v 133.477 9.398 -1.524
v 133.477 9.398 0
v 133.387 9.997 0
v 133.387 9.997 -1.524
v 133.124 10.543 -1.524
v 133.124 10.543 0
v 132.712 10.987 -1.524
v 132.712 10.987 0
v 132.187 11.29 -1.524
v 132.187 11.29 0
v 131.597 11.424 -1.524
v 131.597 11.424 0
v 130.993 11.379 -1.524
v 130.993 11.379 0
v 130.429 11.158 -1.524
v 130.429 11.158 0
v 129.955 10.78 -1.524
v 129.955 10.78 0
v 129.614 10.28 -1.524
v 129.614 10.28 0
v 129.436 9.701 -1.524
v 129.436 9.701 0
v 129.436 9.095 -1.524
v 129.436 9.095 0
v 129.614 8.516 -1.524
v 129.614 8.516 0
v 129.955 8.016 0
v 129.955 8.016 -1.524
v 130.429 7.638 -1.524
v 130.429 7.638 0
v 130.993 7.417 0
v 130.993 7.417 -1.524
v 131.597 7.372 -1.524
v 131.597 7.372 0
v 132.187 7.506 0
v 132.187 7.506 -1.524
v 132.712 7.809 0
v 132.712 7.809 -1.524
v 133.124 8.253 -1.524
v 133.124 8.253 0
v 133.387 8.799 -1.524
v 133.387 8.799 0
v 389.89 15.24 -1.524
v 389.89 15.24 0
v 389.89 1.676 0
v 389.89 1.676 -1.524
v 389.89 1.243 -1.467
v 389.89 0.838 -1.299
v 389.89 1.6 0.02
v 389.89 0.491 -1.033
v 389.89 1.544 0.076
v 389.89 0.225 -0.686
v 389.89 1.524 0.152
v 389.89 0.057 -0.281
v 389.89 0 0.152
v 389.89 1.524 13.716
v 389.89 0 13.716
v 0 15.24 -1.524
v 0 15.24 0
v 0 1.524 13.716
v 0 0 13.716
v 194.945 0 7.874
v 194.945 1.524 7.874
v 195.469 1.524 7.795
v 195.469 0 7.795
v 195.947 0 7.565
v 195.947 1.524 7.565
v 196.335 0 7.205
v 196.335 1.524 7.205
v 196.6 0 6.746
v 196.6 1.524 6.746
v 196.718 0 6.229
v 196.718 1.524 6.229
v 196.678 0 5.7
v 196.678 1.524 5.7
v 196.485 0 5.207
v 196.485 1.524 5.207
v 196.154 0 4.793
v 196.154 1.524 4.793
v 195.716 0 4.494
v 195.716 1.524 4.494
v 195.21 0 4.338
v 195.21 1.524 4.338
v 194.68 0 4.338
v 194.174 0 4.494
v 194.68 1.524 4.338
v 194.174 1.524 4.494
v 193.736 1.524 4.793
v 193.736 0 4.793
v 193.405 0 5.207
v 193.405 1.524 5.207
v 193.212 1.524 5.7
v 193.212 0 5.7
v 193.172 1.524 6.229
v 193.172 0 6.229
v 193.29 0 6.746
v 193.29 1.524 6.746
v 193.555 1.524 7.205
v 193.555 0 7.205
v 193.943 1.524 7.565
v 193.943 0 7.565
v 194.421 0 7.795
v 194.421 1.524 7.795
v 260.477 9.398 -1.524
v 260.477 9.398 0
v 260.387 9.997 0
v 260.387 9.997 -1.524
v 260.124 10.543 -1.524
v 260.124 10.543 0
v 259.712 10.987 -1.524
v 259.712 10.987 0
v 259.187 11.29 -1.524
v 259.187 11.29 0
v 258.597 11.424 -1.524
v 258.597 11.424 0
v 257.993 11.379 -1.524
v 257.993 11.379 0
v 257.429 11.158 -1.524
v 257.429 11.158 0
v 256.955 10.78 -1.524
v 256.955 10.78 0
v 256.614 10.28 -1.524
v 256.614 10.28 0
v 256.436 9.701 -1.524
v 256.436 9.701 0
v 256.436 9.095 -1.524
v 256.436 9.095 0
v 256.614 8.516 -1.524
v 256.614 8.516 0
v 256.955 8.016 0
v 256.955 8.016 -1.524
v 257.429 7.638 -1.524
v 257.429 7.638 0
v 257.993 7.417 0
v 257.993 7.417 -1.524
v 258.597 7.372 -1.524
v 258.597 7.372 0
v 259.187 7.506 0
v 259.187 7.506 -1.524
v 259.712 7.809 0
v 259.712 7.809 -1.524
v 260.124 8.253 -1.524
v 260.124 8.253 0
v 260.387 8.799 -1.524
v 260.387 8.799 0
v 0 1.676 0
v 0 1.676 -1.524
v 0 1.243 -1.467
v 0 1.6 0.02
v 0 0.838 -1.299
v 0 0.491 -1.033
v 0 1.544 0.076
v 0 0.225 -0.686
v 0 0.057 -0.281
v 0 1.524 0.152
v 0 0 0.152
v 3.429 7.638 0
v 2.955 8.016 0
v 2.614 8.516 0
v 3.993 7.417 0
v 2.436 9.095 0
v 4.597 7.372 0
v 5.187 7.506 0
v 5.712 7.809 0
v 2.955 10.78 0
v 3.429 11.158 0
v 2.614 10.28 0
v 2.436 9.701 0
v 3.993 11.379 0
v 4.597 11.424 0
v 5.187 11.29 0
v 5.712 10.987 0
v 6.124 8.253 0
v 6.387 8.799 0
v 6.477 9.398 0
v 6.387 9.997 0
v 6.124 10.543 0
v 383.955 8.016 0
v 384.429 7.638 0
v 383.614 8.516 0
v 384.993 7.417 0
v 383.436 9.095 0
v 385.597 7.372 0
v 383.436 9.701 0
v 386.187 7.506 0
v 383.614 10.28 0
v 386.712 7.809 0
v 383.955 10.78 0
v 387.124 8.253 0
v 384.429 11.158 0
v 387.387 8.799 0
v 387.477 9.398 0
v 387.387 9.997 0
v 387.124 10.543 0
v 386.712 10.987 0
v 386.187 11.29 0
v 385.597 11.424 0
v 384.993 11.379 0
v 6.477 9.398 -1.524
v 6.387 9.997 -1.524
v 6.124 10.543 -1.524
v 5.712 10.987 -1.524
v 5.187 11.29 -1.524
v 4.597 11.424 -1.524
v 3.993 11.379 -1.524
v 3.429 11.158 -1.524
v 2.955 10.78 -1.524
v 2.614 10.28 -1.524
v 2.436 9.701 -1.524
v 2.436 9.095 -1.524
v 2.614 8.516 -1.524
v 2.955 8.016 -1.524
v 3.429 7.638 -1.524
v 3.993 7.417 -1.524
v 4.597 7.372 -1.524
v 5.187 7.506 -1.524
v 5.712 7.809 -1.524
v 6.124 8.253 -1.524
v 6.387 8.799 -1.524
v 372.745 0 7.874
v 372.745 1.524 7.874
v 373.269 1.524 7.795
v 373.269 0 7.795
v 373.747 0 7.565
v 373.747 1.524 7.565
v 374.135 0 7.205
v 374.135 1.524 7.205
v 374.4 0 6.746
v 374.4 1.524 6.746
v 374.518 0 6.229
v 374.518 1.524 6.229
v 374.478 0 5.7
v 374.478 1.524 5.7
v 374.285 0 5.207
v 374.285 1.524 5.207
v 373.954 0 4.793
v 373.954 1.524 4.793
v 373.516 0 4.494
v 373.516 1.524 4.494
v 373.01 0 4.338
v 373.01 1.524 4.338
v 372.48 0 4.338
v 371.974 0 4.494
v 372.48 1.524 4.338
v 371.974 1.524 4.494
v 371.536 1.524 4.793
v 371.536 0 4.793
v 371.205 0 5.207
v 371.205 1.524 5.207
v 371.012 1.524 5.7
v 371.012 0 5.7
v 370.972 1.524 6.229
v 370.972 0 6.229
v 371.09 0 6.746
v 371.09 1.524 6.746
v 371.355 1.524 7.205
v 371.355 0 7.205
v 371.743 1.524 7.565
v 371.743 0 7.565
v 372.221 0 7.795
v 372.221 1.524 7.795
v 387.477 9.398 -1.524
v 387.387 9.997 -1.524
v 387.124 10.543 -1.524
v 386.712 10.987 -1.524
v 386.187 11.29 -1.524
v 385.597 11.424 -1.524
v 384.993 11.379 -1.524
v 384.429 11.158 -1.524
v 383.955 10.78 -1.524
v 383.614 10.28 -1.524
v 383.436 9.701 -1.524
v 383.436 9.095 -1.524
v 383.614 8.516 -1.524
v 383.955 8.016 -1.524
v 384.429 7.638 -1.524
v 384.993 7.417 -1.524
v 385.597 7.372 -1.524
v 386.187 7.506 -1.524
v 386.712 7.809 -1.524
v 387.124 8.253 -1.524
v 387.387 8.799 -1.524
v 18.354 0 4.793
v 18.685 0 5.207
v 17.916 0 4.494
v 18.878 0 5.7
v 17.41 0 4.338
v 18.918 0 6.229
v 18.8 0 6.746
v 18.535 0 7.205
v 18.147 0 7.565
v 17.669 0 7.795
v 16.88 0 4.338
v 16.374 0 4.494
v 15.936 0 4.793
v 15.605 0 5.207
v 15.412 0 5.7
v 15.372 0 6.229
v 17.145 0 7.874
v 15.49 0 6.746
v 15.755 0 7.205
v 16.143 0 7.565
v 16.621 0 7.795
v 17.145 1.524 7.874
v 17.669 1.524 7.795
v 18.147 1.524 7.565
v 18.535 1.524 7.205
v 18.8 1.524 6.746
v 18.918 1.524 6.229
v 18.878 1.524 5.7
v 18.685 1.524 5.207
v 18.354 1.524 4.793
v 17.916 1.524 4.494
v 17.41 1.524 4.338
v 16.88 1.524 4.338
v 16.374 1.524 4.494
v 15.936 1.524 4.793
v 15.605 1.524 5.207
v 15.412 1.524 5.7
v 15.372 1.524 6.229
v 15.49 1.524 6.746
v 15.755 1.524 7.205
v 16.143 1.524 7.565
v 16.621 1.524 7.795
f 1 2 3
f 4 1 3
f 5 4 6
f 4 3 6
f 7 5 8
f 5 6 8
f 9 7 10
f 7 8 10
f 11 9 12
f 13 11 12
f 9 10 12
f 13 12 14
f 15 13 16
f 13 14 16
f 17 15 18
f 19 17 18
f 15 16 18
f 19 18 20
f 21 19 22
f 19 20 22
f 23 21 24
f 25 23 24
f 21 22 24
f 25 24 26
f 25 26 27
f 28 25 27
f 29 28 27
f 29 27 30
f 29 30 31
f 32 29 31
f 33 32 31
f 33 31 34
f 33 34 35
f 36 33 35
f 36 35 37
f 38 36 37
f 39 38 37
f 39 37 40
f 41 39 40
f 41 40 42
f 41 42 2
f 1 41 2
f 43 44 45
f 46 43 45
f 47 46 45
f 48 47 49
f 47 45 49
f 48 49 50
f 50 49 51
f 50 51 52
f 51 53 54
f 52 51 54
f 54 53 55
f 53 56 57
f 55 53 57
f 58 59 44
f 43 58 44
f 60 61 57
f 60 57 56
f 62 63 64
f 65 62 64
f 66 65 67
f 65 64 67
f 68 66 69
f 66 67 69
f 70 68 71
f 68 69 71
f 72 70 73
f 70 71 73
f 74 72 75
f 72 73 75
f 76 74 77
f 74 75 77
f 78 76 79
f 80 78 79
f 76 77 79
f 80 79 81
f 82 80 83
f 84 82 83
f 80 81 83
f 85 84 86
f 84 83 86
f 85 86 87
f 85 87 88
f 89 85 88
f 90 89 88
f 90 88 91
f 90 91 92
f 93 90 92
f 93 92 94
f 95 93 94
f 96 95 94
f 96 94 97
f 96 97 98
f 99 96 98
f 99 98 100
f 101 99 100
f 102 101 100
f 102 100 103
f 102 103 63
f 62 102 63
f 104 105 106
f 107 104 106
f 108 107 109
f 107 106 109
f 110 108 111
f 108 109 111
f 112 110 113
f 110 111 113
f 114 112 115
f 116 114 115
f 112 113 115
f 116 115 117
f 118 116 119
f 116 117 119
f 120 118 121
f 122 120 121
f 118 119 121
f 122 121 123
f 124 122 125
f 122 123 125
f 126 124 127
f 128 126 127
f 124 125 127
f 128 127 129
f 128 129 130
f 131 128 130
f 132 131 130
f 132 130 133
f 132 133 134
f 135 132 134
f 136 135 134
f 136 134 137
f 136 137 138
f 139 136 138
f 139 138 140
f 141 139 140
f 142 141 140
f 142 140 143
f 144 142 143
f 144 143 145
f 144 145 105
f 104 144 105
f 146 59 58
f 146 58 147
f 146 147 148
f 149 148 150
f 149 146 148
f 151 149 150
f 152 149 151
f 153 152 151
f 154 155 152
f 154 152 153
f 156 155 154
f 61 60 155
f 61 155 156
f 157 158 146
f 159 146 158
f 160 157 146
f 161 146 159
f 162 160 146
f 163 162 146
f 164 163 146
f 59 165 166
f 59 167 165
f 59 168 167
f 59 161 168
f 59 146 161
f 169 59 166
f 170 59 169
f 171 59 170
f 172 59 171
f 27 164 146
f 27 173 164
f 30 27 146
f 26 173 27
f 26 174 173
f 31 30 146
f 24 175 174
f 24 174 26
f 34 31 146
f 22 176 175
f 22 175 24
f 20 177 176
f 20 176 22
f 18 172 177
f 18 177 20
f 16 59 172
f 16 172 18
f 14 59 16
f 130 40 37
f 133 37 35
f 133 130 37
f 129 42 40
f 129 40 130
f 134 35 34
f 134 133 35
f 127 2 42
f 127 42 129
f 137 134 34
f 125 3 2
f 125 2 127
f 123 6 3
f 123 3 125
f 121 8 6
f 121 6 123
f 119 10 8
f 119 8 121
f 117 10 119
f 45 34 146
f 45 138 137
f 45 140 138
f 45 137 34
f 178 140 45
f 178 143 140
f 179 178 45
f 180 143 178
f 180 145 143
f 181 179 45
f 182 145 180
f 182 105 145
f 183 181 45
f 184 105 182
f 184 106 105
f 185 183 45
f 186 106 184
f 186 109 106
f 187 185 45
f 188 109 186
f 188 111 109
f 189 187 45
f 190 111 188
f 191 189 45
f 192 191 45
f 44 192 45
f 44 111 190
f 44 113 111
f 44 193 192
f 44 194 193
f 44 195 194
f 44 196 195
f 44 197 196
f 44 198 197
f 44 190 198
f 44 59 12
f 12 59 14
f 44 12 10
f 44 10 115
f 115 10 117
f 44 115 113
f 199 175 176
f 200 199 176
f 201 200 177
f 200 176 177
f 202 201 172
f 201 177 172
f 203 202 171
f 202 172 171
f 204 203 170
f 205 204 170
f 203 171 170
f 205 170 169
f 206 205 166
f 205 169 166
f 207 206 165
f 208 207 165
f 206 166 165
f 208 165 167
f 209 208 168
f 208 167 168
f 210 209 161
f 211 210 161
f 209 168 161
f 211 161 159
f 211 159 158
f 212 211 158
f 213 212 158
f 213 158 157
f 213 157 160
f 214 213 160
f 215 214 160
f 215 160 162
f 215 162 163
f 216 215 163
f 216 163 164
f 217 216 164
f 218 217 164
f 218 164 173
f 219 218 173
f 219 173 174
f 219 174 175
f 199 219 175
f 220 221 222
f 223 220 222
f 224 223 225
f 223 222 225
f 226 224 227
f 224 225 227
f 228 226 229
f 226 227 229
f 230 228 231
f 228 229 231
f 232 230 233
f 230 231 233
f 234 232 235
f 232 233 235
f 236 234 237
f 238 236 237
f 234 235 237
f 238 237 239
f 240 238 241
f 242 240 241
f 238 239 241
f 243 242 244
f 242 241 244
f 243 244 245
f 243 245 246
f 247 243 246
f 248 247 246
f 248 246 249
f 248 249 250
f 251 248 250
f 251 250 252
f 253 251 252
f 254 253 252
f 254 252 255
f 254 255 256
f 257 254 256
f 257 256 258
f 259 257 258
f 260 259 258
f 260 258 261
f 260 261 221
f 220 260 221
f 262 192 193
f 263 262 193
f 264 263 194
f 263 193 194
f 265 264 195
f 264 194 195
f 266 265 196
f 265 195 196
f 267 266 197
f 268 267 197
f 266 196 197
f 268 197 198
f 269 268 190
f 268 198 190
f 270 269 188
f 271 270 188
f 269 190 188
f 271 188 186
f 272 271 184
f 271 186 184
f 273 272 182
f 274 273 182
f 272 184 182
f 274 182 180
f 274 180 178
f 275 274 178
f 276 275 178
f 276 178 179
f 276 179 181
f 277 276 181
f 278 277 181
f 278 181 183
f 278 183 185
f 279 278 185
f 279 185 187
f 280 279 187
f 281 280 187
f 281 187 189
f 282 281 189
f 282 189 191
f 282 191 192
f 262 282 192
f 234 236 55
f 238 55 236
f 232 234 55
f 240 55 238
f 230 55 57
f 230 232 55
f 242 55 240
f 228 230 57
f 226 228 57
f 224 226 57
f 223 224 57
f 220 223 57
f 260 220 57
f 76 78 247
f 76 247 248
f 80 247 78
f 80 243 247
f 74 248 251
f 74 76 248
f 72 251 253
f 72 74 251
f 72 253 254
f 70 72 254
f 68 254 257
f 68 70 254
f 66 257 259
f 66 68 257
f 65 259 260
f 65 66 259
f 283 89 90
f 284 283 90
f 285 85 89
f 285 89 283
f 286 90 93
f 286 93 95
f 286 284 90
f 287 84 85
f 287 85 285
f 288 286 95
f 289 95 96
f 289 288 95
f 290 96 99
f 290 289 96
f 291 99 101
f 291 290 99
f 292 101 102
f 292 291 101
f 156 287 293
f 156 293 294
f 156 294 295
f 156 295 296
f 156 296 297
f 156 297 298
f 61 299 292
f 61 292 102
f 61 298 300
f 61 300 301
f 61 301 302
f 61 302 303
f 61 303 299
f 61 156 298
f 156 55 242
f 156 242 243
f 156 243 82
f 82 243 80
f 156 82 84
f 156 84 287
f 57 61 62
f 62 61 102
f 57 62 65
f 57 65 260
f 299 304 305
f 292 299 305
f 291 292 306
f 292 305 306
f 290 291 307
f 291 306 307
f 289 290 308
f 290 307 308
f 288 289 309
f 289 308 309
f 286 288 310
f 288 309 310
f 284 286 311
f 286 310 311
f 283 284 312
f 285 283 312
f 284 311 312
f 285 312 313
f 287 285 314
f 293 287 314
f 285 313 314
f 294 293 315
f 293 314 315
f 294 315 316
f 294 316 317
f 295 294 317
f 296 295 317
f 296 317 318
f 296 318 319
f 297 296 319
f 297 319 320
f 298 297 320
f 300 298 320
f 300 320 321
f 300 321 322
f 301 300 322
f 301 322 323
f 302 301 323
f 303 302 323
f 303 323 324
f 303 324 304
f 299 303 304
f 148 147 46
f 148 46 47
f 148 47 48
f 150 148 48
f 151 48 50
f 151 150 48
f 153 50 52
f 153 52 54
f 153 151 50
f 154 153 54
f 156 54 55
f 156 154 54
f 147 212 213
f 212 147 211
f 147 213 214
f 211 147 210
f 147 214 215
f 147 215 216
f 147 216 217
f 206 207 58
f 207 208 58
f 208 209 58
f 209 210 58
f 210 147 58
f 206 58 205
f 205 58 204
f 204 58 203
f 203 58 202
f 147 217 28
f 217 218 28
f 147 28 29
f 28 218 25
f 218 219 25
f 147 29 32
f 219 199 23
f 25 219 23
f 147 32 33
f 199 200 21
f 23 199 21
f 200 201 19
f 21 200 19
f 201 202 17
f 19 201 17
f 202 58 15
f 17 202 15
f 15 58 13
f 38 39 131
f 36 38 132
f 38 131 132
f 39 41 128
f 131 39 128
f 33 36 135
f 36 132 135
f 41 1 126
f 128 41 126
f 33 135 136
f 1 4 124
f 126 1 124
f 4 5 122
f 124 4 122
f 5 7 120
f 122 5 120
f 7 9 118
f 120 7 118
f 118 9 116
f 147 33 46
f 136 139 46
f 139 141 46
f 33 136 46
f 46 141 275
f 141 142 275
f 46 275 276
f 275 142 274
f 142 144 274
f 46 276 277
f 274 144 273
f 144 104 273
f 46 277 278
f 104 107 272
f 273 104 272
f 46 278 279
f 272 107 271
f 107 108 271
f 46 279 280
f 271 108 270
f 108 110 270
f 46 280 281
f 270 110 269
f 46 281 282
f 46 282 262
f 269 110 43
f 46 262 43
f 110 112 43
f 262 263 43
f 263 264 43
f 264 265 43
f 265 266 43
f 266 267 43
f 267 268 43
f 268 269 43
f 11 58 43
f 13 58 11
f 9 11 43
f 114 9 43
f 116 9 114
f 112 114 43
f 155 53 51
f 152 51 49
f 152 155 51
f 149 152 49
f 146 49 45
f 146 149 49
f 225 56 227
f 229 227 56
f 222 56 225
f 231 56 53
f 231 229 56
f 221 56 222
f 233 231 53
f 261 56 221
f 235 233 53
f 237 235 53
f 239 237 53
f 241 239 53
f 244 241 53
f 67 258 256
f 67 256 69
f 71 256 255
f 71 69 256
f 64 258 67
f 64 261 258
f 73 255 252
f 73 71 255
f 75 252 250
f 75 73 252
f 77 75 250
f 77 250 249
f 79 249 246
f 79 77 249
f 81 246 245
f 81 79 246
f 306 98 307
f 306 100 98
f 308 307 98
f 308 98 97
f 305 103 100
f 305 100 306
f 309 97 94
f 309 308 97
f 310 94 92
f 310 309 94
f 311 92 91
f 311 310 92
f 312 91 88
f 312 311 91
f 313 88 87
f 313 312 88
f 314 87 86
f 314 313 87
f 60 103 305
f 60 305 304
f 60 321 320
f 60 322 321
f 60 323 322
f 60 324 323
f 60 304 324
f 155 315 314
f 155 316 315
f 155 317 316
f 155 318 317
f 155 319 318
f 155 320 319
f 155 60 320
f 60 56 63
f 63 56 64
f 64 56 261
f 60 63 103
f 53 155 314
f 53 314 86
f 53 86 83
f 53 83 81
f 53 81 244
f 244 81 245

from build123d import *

# Parameters (mm, degrees)
SKETCH1_W                    = 389.89
SKETCH1_H                    = 15.24
BASE_FLANGE1_DEPTH           = 1.524
EDGE_FLANGE1_STRIP_W         = 6.4008
EDGE_FLANGE1_STRIP_H         = 1.524
EDGE_FLANGE1_STRIP_CUT_DEPTH = 389.89
EDGE_FLANGE1_DEPTH           = 389.89
SKETCH9_R                    = 2.032
CUT_EXTRUDE1_DEPTH           = 2.54
SKETCH10_R                   = 1.778
CUT_EXTRUDE2_DEPTH           = 2.54


# Sheet-metal steps are written as plain solids
with BuildPart() as part:
    # Sketch1 → Base-Flange1 (new body)
    with BuildSketch(Plane.XY):
        with Locations((194.945, 7.62)):
            Rectangle(SKETCH1_W, SKETCH1_H)
    extrude(amount=-BASE_FLANGE1_DEPTH)

    # Edge-Flange1 strip (across the edge) → Edge-Flange1 strip cut (cut)
    with BuildSketch(Plane.YZ):
        with Locations((-1.524, -0.762)):
            Rectangle(EDGE_FLANGE1_STRIP_W, EDGE_FLANGE1_STRIP_H)
    extrude(amount=EDGE_FLANGE1_STRIP_CUT_DEPTH, mode=Mode.SUBTRACT)

    # Edge-Flange1 section (across the edge) → Edge-Flange1 (add)
    with BuildSketch(Plane.YZ):
        with BuildLine():
            Line((0, 0.1524), (0, 13.716))
            Line((0, 13.716), (1.524, 13.716))
            Line((1.524, 13.716), (1.524, 0.1524))
            ThreePointArc((1.524, 0.1524), (1.568636927, 0.044636927), (1.6764, 0))
            Line((1.6764, 0), (1.6764, -1.524))
            ThreePointArc((1.6764, -1.524), (0.491006192, -1.032993808), (0, 0.1524))
        make_face()
    extrude(amount=EDGE_FLANGE1_DEPTH)

    # Sketch9 → Cut-Extrude1 (cut)
    with BuildSketch(Plane.XY):
        with Locations((4.445, 9.398)):
            Circle(SKETCH9_R)
        with Locations((131.445, 9.398)):
            Circle(SKETCH9_R)
        with Locations((258.445, 9.398)):
            Circle(SKETCH9_R)
        with Locations((385.445, 9.398)):
            Circle(SKETCH9_R)
    extrude(amount=-CUT_EXTRUDE1_DEPTH, mode=Mode.SUBTRACT)

    # Sketch10 → Cut-Extrude2 (cut)
    with BuildSketch(Plane(origin=(0, 1.524, 0), x_dir=(1, 0, 0), z_dir=(0, 1, 0))):
        with Locations(Location((372.745, -6.096, 0), (0, 0, 270))):
            Circle(SKETCH10_R)
        with Locations(Location((194.945, -6.096, 0), (0, 0, 270))):
            Circle(SKETCH10_R)
        with Locations(Location((17.145, -6.096, 0), (0, 0, 270))):
            Circle(SKETCH10_R)
    extrude(amount=-CUT_EXTRUDE2_DEPTH, mode=Mode.SUBTRACT)


solid = part.part
